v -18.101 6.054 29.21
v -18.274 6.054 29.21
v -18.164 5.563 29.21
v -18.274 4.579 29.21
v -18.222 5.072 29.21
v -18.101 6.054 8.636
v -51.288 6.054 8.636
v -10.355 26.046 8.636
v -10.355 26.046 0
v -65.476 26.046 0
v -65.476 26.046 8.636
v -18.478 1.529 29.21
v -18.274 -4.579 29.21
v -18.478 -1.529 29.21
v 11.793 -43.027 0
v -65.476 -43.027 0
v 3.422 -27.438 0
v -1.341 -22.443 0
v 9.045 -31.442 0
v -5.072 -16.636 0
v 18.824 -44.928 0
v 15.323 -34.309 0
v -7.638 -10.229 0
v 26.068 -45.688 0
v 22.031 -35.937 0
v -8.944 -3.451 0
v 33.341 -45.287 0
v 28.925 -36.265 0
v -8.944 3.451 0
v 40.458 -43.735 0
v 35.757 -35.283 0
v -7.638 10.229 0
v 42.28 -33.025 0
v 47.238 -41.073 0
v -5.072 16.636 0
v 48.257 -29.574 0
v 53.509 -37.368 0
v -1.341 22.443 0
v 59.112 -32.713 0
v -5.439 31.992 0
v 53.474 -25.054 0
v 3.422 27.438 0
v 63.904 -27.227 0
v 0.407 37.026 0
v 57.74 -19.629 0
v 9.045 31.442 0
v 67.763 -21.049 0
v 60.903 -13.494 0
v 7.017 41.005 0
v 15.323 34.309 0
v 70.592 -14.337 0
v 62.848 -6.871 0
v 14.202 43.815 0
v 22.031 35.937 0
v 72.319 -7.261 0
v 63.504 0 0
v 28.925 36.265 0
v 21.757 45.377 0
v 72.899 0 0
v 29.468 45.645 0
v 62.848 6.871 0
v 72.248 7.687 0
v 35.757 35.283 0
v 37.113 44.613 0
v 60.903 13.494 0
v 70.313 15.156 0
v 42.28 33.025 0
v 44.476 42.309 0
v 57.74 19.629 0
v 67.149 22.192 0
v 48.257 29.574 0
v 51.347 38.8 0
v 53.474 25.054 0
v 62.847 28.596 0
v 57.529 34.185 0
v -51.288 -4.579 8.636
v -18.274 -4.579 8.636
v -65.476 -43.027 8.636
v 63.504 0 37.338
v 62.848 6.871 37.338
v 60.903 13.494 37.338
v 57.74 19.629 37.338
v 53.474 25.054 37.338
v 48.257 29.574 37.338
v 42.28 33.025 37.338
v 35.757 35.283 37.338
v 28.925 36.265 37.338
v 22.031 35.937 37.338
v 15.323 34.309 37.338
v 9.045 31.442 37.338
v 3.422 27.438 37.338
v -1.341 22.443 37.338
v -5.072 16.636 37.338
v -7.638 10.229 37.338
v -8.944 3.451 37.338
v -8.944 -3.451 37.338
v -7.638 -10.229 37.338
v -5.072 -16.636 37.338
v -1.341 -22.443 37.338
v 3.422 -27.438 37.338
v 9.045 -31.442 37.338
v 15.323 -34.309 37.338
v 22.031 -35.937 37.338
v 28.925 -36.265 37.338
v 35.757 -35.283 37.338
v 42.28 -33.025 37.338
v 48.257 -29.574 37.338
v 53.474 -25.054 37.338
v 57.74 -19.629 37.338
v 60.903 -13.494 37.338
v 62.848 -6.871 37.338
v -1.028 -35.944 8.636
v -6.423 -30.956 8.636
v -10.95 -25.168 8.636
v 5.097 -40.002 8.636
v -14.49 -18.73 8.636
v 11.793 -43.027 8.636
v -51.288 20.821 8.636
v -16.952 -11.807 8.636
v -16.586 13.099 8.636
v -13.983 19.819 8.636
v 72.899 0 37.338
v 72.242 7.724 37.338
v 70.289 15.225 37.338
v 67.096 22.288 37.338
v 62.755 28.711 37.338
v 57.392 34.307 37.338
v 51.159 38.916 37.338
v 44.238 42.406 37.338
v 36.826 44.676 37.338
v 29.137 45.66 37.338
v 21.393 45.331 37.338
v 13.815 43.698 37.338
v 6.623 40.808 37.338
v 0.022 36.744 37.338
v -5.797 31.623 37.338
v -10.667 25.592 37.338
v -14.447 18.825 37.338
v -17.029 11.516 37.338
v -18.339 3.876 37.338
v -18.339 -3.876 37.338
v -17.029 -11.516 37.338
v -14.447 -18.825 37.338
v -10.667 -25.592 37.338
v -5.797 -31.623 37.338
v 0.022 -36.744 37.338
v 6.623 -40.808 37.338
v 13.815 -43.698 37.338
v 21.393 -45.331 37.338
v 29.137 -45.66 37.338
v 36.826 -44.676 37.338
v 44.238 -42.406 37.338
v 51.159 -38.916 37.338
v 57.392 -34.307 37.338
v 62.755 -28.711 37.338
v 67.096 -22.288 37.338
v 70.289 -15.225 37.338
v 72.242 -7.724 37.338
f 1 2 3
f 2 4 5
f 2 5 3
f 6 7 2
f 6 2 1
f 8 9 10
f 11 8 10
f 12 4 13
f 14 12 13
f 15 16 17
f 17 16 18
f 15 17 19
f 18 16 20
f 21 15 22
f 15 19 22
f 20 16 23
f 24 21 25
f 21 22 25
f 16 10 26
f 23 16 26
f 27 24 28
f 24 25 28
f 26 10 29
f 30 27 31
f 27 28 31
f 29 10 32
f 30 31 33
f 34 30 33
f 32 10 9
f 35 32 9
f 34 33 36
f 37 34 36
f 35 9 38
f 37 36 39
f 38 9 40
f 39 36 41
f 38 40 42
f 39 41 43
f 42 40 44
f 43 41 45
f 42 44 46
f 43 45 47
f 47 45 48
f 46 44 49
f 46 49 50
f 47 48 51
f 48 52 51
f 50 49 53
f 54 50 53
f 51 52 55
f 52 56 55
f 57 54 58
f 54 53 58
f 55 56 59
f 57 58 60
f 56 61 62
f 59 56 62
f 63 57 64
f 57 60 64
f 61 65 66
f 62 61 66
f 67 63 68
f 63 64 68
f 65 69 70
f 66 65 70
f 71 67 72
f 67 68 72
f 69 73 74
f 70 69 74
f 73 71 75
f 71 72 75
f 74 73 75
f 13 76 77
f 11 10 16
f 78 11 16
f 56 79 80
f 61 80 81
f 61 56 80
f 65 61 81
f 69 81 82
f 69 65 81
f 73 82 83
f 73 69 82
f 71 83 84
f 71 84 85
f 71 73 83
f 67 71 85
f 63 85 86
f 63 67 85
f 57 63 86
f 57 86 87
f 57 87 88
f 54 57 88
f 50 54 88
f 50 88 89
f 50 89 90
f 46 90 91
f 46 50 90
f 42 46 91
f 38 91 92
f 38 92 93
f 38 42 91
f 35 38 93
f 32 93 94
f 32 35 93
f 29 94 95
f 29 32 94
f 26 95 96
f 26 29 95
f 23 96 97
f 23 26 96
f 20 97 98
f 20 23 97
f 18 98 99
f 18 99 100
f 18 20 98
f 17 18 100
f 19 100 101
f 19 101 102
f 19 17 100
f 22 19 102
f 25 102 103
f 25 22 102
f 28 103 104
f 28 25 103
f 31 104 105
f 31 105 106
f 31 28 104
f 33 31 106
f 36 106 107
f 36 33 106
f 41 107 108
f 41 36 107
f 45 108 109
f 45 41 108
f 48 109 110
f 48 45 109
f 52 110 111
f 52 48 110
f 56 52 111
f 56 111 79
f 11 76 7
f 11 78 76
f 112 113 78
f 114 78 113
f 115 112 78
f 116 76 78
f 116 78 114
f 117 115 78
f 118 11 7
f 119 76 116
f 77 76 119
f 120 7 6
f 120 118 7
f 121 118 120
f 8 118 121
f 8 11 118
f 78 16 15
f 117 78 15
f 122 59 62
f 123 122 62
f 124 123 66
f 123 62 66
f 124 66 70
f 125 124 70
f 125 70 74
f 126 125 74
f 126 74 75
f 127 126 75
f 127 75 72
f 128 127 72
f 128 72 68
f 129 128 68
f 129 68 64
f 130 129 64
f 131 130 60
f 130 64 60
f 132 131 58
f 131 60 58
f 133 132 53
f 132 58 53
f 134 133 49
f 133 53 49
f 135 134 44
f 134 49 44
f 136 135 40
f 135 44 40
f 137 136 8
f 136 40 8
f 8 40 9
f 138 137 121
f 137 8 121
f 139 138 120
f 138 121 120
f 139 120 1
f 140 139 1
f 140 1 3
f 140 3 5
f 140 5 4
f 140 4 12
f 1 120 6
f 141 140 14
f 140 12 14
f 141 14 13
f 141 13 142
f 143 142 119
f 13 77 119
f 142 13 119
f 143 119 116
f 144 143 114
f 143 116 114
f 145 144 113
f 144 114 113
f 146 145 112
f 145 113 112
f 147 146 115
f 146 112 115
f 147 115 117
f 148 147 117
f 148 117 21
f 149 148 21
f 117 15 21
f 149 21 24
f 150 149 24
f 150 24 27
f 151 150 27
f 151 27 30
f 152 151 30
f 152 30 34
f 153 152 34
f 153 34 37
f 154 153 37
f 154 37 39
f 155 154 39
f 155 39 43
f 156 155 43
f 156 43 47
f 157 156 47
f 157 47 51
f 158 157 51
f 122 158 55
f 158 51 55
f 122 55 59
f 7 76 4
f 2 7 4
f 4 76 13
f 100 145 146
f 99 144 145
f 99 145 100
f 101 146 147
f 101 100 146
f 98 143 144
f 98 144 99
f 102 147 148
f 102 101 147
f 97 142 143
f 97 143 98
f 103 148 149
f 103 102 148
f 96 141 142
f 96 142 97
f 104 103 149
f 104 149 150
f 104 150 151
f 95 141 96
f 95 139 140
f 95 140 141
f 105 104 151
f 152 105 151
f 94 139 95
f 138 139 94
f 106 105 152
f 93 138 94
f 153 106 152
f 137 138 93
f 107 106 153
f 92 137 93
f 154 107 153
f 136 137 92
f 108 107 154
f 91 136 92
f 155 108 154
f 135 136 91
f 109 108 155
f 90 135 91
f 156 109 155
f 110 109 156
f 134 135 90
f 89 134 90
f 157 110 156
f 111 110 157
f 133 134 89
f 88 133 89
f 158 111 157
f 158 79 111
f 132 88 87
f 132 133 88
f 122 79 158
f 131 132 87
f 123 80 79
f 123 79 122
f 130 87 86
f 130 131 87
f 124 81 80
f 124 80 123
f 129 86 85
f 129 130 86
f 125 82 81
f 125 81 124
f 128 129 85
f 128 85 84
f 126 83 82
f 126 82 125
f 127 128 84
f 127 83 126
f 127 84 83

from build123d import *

# Parameters (mm, degrees)
F1_DEPTH = 8.636
F2_R     = 45.701569
F2_R_2   = 36.306047
F3_DEPTH = 37.338
F4_W     = 38.73572
F4_H     = 10.633336
F5_DEPTH = 29.21
F7_DEPTH = 25.4


with BuildPart() as f1:
    # F0 (on Top) → F1 (new body)
    with BuildSketch(Plane.XY):
        with BuildLine():
            Line((-7.171682, 26.046421), (-65.475807, 26.046421))
            Line((-65.475807, 26.046421), (-65.475807, -43.026961))
            Line((-65.475807, -43.026961), (12.891302, -43.026961))
            ThreePointArc((12.891302, -43.026961), (-13.155731, -13.142128), (-7.171682, 26.046421))
        make_face()
    extrude(amount=F1_DEPTH)

    # F2 (on Top) → F3 (join)
    with BuildSketch(Plane.XY):
        with Locations((27.197642, 0)):
            Circle(F2_R)
        with Locations((27.197642, 0)):
            Circle(F2_R_2, mode=Mode.SUBTRACT)
    extrude(amount=F3_DEPTH)

    # F4 (on Top) → F5 (join)
    with BuildSketch(Plane.XY):
        with Locations((-31.920592, 0.737219)):
            Rectangle(F4_W, F4_H)
    extrude(amount=F5_DEPTH)

    # F6 (on face) → F7 (cut)
    with BuildSketch(Plane.XZ.offset(4.579449)):
        Polygon((-51.288452, 8.636), (-18.27391, 29.21), (-51.288452, 29.21), align=None)
    extrude(amount=-F7_DEPTH, mode=Mode.SUBTRACT)


solid = f1.part
